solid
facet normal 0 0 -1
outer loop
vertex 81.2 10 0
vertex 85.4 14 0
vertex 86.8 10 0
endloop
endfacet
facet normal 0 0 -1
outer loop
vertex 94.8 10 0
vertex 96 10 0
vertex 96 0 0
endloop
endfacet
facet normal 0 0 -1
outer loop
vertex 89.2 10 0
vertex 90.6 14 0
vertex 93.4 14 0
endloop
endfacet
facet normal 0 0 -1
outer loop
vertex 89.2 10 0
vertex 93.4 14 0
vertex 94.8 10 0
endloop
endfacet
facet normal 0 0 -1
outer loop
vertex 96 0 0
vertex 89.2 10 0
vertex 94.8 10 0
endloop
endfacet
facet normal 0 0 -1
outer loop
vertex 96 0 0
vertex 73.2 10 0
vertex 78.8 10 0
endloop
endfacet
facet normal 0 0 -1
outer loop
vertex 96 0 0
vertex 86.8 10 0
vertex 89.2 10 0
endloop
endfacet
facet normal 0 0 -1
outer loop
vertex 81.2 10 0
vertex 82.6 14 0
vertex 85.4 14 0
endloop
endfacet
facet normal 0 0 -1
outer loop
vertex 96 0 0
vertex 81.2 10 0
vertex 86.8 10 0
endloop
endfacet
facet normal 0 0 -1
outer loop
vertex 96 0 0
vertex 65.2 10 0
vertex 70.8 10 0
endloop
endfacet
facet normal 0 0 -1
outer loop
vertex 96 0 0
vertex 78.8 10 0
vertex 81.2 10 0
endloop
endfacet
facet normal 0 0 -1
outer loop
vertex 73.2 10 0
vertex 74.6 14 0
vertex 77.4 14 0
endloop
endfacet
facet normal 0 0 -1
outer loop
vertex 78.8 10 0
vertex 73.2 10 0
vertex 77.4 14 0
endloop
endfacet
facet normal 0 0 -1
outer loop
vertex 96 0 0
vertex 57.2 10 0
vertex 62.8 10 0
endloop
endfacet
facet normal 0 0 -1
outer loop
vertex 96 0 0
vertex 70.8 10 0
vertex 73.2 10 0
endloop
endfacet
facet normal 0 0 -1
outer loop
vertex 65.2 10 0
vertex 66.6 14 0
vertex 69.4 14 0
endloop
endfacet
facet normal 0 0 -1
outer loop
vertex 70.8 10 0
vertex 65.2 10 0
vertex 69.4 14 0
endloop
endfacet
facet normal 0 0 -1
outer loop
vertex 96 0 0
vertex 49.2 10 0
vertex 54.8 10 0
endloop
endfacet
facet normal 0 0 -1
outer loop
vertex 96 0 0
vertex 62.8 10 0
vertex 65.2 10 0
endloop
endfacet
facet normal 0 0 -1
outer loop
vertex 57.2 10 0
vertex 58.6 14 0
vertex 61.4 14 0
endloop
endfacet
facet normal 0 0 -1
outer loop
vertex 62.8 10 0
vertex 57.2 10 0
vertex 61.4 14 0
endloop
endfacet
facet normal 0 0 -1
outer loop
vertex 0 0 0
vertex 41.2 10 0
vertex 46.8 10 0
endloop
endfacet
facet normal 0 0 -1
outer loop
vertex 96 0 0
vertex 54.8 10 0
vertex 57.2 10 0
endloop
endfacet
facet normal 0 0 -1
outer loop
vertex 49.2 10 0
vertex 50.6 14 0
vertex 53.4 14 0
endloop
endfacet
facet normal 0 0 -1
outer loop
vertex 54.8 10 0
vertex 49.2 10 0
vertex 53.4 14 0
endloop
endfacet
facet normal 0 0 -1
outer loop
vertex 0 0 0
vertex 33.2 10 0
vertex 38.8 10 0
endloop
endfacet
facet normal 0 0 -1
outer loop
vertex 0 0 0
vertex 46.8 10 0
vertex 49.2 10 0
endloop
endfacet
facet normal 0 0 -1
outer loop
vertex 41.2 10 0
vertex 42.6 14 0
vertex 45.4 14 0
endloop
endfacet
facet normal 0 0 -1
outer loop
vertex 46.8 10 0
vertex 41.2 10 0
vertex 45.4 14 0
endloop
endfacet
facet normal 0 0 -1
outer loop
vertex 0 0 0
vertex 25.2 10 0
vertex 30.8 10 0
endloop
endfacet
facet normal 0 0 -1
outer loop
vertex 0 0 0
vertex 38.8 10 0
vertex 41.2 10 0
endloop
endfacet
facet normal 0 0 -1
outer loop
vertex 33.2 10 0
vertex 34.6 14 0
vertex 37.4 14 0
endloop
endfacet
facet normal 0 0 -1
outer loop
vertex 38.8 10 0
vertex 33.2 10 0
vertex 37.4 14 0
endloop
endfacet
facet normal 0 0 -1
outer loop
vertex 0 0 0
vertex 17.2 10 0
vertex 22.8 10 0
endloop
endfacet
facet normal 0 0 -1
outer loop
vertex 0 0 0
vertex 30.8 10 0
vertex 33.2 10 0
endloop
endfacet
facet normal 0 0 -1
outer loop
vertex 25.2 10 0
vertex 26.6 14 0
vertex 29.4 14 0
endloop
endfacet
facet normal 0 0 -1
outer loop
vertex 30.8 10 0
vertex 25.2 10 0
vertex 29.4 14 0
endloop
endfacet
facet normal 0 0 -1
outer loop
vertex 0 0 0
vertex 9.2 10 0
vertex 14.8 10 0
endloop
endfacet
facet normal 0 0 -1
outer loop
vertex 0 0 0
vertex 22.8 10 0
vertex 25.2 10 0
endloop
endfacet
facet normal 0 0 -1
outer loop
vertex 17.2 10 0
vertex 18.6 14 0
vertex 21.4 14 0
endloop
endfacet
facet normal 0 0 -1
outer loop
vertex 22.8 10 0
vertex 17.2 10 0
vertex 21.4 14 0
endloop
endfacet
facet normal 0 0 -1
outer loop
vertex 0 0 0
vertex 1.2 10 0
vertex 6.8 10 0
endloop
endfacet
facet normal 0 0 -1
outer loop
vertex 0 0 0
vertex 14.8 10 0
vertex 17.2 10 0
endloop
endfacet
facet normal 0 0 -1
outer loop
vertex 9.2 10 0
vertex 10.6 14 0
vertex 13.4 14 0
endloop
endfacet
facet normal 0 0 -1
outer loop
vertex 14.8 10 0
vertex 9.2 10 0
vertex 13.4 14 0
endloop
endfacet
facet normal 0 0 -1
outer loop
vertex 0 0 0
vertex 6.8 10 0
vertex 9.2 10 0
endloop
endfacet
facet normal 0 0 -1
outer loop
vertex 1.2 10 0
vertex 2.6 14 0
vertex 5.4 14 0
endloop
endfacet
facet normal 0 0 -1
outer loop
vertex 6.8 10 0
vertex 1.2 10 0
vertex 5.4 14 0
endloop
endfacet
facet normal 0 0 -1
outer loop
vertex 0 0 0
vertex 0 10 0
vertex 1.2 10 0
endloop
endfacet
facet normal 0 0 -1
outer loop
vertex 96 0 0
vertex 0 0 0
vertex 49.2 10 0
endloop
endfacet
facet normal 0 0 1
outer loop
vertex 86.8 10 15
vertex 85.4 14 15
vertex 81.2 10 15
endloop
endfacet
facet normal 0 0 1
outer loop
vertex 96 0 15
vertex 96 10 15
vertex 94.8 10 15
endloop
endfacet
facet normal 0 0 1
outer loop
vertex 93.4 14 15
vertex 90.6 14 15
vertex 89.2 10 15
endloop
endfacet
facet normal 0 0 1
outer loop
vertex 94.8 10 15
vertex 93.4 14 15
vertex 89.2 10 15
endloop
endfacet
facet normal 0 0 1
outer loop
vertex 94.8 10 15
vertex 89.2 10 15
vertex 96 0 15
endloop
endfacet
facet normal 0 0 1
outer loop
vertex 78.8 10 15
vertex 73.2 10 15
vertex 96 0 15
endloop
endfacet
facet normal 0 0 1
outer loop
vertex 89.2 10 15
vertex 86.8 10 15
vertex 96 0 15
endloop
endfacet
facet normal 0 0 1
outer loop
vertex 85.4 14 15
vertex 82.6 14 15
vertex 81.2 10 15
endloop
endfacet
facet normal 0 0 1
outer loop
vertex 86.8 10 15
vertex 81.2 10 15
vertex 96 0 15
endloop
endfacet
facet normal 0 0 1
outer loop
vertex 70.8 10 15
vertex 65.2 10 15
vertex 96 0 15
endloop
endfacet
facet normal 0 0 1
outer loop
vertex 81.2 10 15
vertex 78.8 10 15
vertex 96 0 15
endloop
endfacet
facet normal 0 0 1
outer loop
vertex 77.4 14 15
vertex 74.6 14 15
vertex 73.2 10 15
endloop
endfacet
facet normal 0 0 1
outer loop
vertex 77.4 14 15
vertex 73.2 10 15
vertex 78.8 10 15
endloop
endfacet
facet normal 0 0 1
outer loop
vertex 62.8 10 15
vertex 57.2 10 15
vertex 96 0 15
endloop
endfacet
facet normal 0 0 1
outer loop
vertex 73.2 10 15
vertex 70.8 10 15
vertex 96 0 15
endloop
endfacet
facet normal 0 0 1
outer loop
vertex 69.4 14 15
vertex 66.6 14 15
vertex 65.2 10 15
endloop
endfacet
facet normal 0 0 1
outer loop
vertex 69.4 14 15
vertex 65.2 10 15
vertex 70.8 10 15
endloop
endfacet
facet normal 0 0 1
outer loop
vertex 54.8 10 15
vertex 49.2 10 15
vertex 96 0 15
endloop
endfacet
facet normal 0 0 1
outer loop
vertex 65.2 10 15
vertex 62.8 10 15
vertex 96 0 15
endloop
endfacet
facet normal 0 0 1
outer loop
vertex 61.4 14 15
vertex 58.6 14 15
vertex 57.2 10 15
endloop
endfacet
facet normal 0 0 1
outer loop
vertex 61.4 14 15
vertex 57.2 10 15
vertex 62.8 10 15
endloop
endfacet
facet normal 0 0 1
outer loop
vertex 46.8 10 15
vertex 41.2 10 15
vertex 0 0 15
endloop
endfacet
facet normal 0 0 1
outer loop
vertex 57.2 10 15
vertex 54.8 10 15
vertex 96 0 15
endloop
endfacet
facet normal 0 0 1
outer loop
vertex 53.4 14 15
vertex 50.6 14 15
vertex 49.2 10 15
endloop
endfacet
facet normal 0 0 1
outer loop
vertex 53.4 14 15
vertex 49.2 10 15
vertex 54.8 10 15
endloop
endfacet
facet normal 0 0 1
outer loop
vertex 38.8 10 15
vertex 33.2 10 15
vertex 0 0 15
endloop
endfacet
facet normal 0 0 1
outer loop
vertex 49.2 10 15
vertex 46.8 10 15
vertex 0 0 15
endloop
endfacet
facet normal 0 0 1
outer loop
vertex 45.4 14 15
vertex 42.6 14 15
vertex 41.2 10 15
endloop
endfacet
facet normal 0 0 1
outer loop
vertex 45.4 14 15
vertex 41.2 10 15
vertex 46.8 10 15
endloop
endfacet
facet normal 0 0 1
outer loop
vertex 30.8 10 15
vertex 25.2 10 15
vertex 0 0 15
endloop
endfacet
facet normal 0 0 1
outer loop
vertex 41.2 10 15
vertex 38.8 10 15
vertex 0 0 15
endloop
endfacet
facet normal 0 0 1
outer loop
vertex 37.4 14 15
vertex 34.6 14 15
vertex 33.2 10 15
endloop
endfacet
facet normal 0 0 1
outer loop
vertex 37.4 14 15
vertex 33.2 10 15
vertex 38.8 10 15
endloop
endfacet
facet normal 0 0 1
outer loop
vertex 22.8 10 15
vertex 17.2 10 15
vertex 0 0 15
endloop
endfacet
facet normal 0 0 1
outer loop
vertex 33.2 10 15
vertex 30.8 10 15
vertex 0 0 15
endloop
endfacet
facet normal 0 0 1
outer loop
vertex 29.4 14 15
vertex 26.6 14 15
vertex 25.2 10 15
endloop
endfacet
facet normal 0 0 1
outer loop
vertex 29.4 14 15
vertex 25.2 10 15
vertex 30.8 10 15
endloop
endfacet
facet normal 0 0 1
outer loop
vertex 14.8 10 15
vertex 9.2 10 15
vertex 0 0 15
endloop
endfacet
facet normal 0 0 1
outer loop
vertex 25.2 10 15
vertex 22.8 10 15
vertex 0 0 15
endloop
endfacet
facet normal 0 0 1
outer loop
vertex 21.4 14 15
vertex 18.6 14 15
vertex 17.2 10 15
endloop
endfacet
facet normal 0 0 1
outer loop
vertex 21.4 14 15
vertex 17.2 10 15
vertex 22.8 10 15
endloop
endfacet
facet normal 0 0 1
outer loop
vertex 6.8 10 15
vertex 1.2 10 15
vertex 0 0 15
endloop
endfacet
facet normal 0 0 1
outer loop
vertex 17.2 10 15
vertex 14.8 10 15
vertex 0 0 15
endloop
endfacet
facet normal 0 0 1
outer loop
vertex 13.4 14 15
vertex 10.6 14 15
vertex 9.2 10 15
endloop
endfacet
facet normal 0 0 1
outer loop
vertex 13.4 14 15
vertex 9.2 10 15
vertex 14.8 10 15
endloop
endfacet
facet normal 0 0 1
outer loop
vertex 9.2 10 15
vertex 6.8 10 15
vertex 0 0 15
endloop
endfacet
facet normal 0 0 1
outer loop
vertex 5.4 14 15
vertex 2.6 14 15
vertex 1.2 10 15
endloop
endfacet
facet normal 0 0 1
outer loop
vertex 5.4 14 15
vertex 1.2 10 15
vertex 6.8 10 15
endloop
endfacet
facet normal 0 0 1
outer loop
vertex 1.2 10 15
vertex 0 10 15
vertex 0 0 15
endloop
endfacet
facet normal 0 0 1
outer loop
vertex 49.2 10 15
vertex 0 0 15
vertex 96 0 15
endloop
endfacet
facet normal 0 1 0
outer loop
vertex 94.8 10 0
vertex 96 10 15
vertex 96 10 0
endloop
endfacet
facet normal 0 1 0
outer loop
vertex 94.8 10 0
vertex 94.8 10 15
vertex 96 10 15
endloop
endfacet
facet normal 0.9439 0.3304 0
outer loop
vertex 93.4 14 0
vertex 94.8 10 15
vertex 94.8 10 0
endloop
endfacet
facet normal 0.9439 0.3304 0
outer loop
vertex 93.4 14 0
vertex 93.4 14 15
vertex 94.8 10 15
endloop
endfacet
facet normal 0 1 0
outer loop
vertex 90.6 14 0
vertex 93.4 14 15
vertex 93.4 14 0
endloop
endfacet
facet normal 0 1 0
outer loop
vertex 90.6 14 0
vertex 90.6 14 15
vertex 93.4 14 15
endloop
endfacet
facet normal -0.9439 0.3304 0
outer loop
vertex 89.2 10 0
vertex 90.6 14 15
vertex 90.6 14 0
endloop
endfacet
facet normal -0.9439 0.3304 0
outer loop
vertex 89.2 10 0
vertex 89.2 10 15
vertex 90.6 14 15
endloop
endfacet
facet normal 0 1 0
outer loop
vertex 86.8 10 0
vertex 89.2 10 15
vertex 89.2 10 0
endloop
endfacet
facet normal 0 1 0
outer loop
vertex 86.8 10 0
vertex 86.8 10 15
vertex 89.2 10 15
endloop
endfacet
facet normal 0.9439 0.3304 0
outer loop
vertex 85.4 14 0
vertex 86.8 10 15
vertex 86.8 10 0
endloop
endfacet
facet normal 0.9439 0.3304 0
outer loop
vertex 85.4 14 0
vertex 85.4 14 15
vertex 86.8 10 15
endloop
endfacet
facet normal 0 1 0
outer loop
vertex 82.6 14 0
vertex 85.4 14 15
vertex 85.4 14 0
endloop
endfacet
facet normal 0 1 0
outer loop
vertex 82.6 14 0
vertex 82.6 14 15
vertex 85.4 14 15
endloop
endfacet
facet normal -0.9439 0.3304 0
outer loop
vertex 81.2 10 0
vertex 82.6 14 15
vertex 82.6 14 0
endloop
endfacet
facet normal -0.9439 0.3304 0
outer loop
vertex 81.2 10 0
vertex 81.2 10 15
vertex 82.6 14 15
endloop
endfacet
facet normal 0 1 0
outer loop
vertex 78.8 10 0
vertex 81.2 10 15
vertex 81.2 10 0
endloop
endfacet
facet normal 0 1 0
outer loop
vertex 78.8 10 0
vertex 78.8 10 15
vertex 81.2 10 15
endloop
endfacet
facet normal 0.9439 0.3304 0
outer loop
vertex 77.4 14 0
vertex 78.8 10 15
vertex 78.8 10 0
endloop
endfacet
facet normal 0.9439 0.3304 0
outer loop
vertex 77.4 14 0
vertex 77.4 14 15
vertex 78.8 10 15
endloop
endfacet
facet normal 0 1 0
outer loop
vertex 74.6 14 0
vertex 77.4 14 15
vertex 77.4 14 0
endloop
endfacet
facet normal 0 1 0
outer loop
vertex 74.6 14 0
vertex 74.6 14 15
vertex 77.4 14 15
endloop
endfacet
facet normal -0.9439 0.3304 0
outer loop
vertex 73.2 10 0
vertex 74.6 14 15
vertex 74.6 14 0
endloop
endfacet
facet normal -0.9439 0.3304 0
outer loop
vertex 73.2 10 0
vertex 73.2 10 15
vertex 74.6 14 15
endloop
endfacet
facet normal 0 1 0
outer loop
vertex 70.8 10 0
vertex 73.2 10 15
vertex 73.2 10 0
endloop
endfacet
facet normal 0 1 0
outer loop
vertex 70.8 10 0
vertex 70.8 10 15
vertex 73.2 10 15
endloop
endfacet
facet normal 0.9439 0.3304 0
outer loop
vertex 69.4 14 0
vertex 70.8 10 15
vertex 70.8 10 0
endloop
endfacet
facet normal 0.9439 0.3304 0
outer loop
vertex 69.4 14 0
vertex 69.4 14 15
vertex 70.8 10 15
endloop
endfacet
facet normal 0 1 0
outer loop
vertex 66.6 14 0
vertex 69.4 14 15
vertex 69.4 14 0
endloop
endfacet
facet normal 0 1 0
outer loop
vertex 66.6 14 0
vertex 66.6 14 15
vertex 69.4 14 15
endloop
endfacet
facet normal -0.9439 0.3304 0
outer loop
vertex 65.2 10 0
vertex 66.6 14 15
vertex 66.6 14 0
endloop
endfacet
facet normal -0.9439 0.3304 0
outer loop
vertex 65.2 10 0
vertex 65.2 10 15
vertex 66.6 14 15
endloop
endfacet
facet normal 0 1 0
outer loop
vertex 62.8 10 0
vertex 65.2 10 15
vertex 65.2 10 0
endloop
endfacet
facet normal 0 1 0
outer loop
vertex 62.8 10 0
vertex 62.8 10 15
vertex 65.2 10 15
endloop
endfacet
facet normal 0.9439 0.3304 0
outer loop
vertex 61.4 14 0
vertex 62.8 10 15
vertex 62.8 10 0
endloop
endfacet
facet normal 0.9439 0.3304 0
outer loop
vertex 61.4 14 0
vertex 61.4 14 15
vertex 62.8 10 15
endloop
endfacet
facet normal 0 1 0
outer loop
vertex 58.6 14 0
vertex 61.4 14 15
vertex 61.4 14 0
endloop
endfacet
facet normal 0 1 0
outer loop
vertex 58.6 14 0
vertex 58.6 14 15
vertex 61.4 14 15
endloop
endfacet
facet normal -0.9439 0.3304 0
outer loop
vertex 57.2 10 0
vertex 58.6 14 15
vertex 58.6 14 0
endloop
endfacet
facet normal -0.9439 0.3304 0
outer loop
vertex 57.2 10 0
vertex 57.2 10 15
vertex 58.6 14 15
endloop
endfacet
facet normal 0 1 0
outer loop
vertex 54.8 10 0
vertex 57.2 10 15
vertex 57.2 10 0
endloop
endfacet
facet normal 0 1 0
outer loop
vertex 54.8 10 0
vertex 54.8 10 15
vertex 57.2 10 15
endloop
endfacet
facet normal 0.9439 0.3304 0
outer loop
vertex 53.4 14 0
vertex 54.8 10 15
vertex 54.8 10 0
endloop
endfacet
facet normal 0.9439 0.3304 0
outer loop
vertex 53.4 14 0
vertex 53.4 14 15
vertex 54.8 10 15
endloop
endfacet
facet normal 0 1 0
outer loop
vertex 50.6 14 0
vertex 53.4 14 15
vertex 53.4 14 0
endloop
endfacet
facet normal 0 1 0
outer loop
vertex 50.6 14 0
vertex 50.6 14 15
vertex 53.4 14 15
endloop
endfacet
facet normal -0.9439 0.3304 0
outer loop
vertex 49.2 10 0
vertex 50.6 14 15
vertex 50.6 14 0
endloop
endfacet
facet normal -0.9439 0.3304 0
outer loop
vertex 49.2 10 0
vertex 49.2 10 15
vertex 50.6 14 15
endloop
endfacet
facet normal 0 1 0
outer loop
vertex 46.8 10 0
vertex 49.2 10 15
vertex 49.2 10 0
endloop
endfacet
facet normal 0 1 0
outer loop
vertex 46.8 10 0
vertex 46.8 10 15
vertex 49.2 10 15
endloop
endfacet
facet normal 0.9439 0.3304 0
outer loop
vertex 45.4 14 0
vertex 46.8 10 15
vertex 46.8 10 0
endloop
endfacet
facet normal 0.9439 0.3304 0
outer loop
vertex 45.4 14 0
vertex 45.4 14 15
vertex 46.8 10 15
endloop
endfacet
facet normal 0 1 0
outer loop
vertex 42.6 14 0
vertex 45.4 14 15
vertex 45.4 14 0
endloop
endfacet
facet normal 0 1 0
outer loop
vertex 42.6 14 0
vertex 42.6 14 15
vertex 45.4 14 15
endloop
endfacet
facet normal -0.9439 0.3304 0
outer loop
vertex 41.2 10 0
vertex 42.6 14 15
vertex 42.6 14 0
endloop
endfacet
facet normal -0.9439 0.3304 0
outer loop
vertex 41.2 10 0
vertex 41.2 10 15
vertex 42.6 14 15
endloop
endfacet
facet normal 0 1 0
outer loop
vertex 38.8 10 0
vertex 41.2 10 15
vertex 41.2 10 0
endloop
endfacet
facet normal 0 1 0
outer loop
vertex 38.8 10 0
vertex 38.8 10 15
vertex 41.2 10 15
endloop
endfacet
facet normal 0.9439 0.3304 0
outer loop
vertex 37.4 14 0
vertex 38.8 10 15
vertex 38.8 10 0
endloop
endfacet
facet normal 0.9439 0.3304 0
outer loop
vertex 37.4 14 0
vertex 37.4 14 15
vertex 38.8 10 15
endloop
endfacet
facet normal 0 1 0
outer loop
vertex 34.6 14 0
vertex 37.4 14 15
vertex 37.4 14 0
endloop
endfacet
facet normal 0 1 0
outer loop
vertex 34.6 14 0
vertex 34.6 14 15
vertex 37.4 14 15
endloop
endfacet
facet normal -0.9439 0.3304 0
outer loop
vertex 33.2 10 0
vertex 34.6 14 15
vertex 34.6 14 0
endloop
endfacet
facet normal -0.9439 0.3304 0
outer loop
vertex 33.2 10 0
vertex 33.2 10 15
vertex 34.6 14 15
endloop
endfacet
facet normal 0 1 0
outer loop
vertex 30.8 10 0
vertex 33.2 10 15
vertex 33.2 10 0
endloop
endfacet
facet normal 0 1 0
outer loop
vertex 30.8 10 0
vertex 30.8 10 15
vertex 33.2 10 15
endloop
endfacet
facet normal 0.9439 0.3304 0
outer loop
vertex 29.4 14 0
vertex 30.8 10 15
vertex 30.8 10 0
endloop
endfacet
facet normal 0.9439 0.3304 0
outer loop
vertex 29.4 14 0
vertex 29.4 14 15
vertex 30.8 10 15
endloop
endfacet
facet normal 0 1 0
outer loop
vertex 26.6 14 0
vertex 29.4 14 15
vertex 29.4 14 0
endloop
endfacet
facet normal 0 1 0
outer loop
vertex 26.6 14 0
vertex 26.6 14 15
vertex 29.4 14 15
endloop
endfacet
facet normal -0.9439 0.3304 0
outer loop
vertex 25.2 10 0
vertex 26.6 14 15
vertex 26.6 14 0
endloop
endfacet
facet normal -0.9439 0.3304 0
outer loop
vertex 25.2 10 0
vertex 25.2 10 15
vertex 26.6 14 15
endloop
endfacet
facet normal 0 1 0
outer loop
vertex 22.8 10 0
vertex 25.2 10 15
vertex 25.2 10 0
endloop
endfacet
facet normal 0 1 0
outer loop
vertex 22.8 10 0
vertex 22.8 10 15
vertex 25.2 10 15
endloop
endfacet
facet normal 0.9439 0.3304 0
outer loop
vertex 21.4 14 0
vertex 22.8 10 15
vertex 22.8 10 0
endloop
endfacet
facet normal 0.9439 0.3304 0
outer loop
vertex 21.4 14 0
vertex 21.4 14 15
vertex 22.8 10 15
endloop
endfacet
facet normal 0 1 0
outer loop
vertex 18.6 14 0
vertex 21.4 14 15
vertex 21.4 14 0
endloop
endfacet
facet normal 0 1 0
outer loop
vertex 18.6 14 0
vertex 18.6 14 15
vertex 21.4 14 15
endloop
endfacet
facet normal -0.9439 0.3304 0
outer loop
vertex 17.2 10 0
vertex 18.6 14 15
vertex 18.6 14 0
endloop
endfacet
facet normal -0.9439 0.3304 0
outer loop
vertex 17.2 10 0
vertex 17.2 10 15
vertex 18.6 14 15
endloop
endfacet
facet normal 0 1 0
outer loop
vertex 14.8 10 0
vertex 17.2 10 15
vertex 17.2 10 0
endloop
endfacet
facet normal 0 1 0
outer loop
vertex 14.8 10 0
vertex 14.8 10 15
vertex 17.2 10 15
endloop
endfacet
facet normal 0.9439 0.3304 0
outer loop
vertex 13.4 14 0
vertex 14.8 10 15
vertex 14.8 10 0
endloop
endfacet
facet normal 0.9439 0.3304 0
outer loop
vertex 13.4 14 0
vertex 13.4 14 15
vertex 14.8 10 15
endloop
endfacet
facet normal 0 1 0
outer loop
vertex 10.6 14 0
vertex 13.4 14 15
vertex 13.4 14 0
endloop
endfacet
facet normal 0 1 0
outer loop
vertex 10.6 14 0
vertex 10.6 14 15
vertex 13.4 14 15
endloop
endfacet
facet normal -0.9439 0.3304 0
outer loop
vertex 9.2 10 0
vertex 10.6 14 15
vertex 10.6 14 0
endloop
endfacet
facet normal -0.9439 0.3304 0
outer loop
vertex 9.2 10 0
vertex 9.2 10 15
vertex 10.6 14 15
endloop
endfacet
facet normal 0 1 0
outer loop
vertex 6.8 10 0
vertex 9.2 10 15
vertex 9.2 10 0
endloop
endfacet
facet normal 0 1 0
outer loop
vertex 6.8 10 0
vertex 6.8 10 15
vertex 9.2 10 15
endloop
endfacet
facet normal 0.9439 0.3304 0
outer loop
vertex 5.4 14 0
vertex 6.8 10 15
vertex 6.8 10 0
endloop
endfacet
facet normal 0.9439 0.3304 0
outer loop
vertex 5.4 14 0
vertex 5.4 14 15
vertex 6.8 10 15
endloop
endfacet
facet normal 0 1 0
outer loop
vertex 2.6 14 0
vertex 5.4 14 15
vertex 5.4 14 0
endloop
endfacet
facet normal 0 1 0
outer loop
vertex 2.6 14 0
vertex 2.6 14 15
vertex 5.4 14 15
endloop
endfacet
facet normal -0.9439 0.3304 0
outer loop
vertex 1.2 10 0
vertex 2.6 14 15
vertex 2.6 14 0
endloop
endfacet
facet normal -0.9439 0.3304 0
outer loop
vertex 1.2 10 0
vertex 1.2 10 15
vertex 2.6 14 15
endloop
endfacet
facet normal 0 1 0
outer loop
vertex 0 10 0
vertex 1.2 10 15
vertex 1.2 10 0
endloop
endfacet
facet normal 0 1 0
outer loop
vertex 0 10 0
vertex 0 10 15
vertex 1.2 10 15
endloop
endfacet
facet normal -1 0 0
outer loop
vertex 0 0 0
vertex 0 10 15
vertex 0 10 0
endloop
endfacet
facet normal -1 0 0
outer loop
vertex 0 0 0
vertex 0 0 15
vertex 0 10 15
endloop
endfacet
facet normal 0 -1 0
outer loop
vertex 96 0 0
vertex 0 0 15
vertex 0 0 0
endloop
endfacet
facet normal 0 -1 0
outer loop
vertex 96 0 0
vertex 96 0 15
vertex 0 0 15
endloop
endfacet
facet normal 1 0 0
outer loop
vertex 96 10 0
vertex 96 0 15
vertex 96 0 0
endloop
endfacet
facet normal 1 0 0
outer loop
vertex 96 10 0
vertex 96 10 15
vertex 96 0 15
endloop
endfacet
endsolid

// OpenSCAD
$fn = 32;

// ----------------------------------------------------------------------
// Gear rack: 12 teeth, pitch 8 mm
// ----------------------------------------------------------------------

// --- parameters (mm) ---
teeth = 12;               // number of teeth
pitch = 8;                // tooth pitch, X
root_w = 5.6;             // tooth width at the root
tip_w = 2.8;              // tooth width at the tip
base_h = 10;              // rack body height, Y
tooth_h = 4;              // tooth height above the body
plate_t = 15;             // rack width, Z (extrusion height)

rack_l = teeth * pitch;  // overall length
total_h = base_h + tooth_h;  // overall height

profile = [[0, 0], [96, 0], [96, 10], [94.8, 10], [93.4, 14], [90.6, 14], [89.2, 10], [86.8, 10], [85.4, 14], [82.6, 14], [81.2, 10], [78.8, 10], [77.4, 14], [74.6, 14], [73.2, 10], [70.8, 10], [69.4, 14], [66.6, 14], [65.2, 10], [62.8, 10], [61.4, 14], [58.6, 14], [57.2, 10], [54.8, 10], [53.4, 14], [50.6, 14], [49.2, 10], [46.8, 10], [45.4, 14], [42.6, 14], [41.2, 10], [38.8, 10], [37.4, 14], [34.6, 14], [33.2, 10], [30.8, 10], [29.4, 14], [26.6, 14], [25.2, 10], [22.8, 10], [21.4, 14], [18.6, 14], [17.2, 10], [14.8, 10], [13.4, 14], [10.6, 14], [9.2, 10], [6.8, 10], [5.4, 14], [2.6, 14], [1.2, 10], [0, 10]];  // primary outline, 52 points, counter clockwise

// --- the one profile operation ---
linear_extrude(height = plate_t) polygon(points = profile);
